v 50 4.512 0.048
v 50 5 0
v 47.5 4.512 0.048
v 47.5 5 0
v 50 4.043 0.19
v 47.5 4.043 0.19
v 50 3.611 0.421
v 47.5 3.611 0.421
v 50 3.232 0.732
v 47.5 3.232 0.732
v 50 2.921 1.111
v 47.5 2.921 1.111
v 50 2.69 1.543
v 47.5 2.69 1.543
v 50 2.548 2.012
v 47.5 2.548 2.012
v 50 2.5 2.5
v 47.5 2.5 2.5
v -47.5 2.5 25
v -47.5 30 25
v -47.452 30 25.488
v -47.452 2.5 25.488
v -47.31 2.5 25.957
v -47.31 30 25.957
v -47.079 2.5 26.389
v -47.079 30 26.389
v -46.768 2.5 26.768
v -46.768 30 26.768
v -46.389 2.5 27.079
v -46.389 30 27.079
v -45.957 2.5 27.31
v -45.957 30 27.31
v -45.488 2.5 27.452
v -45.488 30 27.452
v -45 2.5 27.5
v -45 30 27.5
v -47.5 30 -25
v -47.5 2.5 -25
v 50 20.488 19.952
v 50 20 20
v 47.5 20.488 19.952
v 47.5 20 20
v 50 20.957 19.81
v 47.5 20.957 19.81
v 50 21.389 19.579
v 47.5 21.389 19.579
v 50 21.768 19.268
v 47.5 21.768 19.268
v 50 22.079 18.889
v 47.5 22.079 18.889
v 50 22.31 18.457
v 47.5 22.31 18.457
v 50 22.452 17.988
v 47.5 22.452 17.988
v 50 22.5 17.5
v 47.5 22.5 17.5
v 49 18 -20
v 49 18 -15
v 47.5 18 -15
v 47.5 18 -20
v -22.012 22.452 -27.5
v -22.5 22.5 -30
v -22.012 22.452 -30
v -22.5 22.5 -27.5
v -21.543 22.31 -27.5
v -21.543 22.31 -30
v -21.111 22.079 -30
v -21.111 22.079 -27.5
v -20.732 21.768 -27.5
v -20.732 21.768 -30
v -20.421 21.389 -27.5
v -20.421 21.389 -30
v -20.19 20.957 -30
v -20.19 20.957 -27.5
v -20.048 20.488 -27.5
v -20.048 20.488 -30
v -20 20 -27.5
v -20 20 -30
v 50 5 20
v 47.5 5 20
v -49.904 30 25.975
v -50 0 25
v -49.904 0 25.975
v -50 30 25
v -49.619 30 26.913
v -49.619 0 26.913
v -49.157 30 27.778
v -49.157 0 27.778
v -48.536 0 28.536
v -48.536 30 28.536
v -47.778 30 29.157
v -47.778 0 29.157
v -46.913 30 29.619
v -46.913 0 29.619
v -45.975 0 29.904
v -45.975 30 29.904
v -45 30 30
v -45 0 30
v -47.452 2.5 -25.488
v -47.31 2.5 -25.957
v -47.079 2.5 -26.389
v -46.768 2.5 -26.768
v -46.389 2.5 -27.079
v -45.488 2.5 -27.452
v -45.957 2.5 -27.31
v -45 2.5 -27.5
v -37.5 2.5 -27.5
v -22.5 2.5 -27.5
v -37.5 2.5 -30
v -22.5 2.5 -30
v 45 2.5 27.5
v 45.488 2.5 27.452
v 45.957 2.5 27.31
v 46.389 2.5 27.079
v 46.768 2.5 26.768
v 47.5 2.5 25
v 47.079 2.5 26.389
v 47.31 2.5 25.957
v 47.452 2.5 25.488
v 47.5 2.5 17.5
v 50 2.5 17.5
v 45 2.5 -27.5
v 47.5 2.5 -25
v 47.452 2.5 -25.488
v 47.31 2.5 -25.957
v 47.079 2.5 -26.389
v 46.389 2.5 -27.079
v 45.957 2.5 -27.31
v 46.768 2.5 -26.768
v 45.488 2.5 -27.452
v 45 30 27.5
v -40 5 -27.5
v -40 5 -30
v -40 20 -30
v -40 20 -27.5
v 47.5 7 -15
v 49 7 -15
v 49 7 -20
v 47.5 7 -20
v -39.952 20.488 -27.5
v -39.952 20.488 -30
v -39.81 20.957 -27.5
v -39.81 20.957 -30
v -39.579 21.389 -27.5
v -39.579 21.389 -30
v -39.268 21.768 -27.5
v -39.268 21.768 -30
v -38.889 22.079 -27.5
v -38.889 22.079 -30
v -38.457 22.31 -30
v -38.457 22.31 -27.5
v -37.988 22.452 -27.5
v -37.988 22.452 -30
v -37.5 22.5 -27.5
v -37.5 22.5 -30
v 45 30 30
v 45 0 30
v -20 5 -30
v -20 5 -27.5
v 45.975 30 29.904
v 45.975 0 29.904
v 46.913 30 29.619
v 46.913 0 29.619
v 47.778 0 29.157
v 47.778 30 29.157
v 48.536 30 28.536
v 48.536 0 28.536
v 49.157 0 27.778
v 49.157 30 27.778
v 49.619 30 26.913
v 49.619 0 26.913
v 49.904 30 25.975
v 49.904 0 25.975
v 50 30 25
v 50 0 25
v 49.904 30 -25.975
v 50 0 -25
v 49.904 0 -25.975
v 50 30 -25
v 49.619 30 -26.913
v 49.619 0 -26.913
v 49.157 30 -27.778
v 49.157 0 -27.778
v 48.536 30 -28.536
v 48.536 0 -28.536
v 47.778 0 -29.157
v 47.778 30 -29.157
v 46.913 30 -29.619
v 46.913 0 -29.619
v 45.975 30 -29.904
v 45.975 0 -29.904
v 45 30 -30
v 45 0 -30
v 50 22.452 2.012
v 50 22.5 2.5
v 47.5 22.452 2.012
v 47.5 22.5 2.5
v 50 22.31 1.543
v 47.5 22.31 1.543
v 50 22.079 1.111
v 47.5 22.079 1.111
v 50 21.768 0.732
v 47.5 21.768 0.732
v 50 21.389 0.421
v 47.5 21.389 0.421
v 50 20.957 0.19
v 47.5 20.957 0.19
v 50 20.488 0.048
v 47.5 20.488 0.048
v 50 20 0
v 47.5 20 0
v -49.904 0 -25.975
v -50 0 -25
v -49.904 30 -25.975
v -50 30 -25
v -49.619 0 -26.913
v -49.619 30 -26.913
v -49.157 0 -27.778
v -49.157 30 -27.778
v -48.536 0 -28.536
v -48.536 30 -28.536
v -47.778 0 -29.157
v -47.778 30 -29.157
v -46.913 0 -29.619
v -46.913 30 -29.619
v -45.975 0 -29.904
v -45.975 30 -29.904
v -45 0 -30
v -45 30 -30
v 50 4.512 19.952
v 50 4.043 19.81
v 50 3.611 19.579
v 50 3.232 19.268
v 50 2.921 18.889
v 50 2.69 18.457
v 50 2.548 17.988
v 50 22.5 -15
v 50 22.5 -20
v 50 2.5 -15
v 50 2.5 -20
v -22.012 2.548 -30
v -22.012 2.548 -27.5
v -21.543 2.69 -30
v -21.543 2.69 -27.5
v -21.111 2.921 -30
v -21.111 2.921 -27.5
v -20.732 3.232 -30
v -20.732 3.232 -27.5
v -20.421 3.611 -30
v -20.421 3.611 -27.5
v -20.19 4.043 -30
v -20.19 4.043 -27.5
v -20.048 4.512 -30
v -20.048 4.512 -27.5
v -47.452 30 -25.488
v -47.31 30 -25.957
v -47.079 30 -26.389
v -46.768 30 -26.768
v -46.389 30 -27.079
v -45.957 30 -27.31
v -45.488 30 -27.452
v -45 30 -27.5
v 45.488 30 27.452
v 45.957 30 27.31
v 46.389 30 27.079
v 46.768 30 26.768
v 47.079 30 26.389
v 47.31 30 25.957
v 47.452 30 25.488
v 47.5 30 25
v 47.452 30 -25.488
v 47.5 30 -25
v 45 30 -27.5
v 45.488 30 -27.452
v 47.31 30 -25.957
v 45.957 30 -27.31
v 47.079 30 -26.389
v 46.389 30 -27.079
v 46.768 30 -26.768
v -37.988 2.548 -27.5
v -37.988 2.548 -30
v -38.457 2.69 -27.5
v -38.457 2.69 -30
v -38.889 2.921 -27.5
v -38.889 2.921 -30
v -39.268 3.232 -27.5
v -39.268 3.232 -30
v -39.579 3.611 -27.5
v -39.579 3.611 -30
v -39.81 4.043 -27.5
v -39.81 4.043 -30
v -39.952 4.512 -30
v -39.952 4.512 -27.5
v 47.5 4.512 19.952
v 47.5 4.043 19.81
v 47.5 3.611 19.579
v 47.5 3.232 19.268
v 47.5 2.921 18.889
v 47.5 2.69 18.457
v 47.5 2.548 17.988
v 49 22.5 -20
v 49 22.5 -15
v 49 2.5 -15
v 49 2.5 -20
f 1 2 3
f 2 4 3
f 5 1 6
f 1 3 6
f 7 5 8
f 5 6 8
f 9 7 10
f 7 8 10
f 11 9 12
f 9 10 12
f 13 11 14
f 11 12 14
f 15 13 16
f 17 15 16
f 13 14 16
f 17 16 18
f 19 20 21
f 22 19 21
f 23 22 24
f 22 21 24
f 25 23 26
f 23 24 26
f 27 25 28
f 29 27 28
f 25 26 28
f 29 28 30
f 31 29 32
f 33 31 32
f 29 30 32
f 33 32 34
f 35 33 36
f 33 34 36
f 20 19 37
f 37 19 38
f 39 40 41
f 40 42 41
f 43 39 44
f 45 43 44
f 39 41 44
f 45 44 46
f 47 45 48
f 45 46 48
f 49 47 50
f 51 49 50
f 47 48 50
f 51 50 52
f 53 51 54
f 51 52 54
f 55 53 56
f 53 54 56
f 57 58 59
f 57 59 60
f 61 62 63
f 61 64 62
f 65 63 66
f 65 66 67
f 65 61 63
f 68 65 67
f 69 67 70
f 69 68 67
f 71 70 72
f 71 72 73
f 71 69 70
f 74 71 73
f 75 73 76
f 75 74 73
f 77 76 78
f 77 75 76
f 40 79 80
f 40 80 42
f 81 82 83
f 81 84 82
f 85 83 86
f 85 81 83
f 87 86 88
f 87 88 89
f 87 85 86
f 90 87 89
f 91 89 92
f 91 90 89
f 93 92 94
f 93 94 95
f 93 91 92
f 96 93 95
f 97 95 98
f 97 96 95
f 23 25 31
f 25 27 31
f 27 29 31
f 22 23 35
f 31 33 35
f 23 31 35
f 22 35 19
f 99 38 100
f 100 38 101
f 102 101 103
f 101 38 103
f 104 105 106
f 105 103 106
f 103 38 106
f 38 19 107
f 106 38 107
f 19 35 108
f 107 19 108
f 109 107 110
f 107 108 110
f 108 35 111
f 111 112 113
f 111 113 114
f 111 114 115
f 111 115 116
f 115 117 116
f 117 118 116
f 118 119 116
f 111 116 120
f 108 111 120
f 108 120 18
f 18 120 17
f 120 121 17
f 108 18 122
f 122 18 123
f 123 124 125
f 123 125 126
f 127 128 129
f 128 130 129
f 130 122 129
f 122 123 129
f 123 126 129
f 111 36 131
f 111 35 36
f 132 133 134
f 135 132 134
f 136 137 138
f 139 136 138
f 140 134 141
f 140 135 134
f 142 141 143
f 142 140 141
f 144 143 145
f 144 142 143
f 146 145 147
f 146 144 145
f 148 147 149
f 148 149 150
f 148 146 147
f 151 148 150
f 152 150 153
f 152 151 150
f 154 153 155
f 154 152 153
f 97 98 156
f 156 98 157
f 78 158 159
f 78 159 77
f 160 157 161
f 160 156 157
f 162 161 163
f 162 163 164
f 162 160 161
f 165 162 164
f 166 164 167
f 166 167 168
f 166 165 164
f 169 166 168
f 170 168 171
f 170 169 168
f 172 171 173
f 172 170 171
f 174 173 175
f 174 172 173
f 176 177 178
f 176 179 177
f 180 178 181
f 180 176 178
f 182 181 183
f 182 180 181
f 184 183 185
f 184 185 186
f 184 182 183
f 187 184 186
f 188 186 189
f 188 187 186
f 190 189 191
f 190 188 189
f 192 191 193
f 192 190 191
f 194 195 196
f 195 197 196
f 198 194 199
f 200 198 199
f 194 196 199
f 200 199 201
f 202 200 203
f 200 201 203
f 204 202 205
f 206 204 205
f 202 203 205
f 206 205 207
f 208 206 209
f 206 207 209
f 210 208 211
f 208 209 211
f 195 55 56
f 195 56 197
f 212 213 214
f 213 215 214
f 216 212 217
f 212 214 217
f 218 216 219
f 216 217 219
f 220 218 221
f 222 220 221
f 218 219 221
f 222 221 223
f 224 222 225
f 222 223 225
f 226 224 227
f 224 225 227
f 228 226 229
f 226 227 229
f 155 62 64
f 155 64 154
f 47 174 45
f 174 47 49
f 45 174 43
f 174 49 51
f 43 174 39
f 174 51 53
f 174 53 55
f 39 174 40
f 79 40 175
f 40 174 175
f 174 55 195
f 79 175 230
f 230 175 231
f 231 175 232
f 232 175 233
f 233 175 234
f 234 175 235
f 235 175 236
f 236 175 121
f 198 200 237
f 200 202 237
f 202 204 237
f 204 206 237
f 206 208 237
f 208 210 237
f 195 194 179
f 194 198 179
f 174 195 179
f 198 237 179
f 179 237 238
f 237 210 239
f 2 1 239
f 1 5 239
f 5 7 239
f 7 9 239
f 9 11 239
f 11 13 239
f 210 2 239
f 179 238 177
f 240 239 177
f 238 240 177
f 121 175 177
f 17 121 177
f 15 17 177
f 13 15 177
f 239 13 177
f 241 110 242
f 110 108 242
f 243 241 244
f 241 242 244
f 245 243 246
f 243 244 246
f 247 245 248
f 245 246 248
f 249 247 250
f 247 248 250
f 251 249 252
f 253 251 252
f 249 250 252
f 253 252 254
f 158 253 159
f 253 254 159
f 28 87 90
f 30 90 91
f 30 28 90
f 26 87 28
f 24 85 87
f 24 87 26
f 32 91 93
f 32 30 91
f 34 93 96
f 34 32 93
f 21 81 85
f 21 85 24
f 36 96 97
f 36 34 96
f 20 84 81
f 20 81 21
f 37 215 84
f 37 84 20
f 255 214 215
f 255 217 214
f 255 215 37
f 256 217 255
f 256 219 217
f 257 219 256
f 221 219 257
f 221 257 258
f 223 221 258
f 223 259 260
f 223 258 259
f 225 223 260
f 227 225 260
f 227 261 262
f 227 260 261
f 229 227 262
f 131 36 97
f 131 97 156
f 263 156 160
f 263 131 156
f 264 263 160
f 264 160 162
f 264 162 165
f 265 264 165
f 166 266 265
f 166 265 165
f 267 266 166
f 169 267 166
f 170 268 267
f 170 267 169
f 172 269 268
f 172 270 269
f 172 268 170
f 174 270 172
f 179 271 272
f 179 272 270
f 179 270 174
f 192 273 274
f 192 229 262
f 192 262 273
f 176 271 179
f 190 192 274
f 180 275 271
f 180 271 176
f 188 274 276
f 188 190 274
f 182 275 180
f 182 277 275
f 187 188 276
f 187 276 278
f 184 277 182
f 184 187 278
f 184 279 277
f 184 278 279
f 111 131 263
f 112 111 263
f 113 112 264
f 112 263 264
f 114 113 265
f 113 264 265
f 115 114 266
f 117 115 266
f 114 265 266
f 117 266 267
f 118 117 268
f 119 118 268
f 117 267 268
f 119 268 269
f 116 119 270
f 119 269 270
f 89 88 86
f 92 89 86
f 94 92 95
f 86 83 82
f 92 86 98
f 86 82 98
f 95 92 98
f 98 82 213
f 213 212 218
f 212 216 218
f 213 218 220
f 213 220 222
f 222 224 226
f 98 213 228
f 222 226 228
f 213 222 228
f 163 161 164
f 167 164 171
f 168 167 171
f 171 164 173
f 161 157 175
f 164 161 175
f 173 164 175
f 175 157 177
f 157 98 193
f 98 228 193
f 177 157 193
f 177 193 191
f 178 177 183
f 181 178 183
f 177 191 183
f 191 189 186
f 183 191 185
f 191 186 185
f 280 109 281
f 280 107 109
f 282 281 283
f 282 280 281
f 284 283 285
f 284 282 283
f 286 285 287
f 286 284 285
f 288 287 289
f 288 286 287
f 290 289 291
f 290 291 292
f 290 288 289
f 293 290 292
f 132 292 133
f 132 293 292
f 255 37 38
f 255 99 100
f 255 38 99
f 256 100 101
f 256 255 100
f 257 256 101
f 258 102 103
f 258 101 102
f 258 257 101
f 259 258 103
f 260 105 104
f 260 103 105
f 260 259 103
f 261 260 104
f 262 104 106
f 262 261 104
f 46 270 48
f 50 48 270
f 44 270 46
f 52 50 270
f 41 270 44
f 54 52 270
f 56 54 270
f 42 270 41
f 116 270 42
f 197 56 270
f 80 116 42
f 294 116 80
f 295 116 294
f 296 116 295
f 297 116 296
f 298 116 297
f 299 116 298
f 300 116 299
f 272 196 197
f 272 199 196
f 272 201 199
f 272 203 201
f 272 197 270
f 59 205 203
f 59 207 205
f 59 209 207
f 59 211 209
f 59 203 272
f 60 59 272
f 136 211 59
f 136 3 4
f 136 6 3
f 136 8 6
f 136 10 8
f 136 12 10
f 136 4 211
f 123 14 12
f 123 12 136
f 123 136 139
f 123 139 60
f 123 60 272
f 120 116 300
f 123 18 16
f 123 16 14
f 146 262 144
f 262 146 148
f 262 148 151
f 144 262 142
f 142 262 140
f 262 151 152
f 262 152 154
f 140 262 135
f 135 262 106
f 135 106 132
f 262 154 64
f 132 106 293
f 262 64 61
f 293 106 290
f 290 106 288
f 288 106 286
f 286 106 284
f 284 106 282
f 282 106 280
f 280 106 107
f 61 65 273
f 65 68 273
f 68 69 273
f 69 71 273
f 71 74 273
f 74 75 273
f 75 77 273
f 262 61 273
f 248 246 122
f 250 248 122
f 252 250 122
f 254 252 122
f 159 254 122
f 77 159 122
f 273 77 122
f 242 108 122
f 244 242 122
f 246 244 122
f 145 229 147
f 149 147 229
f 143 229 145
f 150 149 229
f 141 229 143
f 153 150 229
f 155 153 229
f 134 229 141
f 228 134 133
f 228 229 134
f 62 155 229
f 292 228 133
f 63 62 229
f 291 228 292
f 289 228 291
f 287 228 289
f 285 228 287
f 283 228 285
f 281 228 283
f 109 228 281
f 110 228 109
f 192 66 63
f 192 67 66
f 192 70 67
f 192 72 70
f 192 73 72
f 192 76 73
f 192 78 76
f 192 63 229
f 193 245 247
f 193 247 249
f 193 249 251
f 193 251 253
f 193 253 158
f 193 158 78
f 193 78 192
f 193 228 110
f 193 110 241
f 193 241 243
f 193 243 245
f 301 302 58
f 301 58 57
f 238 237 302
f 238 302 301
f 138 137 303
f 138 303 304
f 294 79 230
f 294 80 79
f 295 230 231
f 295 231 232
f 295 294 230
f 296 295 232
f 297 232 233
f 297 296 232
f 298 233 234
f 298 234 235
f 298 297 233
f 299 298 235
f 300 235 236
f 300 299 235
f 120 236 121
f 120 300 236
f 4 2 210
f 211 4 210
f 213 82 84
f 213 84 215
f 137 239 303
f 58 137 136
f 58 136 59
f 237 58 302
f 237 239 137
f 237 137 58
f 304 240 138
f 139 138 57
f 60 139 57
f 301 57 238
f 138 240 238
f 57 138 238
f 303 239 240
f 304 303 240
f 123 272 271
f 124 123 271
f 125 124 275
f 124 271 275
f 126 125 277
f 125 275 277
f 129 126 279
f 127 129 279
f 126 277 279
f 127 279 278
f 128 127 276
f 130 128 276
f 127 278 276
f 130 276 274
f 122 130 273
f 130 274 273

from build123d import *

# Parameters (mm, degrees)
SKETCH1_W          = 100
SKETCH1_H          = 60
BASE_DEPTH         = 30
FILLET1_R          = 5
SHELL1_T           = -2.5
CUT_EXTRUDE1_REACH = 110.628
SKETCH2_W          = 20
SKETCH2_H          = 20
FILLET2_R          = 2.5
CUT_EXTRUDE2_REACH = 102.743
SKETCH4_W          = 20
SKETCH4_H          = 20
FILLET3_R          = 2.5
SKETCH5_W          = 5
SKETCH5_H          = 20
CUT_EXTRUDE3_DEPTH = 1
CUT_EXTRUDE5_REACH = 109.708
SKETCH8_W          = 5
SKETCH8_H          = 11


with BuildPart() as part:
    # Sketch1 → Base (new body)
    with BuildSketch(Plane(origin=(0, 0, 0), x_dir=(1, 0, 0), z_dir=(0, 1, 0))):
        Rectangle(SKETCH1_W, SKETCH1_H)
    extrude(amount=BASE_DEPTH)

    # Fillet1
    fillet1_edges = [part.edges().sort_by_distance(p)[0] for p in [
        (50, 15, 30),
        (-50, 15, 30),
        (-50, 15, -30),
        (50, 15, -30),
    ]]
    fillet(fillet1_edges, radius=FILLET1_R)

    # Shell1
    shell1_openings = [part.faces().sort_by_distance(p)[0] for p in [
        (0, 30, 0),
    ]]
    offset(amount=SHELL1_T, openings=shell1_openings, kind=Kind.INTERSECTION)

    # Sketch2 → Cut-Extrude1 (cut, up to next)
    with BuildSketch(Plane(origin=(50, 0, 0), x_dir=(0, 0, -1), z_dir=(1, 0, 0)), mode=Mode.PRIVATE) as cut_extrude1_sk1:
        with Locations((-10, 12.5)):
            Rectangle(SKETCH2_W, SKETCH2_H)
    cut_extrude1_tool1 = extrude(cut_extrude1_sk1.sketch, amount=-CUT_EXTRUDE1_REACH, mode=Mode.PRIVATE) & part.part
    add(cut_extrude1_tool1.solids().sort_by_distance((50, 12.5, 10))[0], mode=Mode.SUBTRACT)

    # Fillet2
    fillet2_edges = [part.edges().sort_by_distance(p)[0] for p in [
        (48.75, 2.5, 20),
        (48.75, 22.5, 20),
        (48.75, 22.5, 0),
        (48.75, 2.5, 0),
    ]]
    fillet(fillet2_edges, radius=FILLET2_R)

    # Sketch4 → Cut-Extrude2 (cut, up to next)
    with BuildSketch(Plane(origin=(-26.934652874, 4.896122142, -30), x_dir=(-1, 0, 0), z_dir=(0, 0, -1)), mode=Mode.PRIVATE) as cut_extrude2_sk1:
        with Locations((3.065347126, 7.603877858)):
            Rectangle(SKETCH4_W, SKETCH4_H)
    cut_extrude2_tool1 = extrude(cut_extrude2_sk1.sketch, amount=-CUT_EXTRUDE2_REACH, mode=Mode.PRIVATE) & part.part
    add(cut_extrude2_tool1.solids().sort_by_distance((-30, 12.5, -30))[0], mode=Mode.SUBTRACT)

    # Fillet3
    fillet3_edges = [part.edges().sort_by_distance(p)[0] for p in [
        (-20, 2.5, -28.75),
        (-20, 22.5, -28.75),
        (-40, 22.5, -28.75),
        (-40, 2.5, -28.75),
    ]]
    fillet(fillet3_edges, radius=FILLET3_R)

    # Sketch5 → Cut-Extrude3 (cut)
    with BuildSketch(Plane(origin=(50, 0, 0), x_dir=(0, 0, -1), z_dir=(1, 0, 0))):
        with Locations((17.5, 12.5)):
            Rectangle(SKETCH5_W, SKETCH5_H)
    extrude(amount=-CUT_EXTRUDE3_DEPTH, mode=Mode.SUBTRACT)

    # Sketch8 → Cut-Extrude5 (cut, up to next)
    with BuildSketch(Plane(origin=(49, 0, 0), x_dir=(0, 0, -1), z_dir=(1, 0, 0)), mode=Mode.PRIVATE) as cut_extrude5_sk1:
        with Locations((17.5, 12.5)):
            Rectangle(SKETCH8_W, SKETCH8_H)
    cut_extrude5_tool1 = extrude(cut_extrude5_sk1.sketch, amount=-CUT_EXTRUDE5_REACH, mode=Mode.PRIVATE) & part.part
    add(cut_extrude5_tool1.solids().sort_by_distance((49, 12.5, -17.5))[0], mode=Mode.SUBTRACT)


solid = part.part
